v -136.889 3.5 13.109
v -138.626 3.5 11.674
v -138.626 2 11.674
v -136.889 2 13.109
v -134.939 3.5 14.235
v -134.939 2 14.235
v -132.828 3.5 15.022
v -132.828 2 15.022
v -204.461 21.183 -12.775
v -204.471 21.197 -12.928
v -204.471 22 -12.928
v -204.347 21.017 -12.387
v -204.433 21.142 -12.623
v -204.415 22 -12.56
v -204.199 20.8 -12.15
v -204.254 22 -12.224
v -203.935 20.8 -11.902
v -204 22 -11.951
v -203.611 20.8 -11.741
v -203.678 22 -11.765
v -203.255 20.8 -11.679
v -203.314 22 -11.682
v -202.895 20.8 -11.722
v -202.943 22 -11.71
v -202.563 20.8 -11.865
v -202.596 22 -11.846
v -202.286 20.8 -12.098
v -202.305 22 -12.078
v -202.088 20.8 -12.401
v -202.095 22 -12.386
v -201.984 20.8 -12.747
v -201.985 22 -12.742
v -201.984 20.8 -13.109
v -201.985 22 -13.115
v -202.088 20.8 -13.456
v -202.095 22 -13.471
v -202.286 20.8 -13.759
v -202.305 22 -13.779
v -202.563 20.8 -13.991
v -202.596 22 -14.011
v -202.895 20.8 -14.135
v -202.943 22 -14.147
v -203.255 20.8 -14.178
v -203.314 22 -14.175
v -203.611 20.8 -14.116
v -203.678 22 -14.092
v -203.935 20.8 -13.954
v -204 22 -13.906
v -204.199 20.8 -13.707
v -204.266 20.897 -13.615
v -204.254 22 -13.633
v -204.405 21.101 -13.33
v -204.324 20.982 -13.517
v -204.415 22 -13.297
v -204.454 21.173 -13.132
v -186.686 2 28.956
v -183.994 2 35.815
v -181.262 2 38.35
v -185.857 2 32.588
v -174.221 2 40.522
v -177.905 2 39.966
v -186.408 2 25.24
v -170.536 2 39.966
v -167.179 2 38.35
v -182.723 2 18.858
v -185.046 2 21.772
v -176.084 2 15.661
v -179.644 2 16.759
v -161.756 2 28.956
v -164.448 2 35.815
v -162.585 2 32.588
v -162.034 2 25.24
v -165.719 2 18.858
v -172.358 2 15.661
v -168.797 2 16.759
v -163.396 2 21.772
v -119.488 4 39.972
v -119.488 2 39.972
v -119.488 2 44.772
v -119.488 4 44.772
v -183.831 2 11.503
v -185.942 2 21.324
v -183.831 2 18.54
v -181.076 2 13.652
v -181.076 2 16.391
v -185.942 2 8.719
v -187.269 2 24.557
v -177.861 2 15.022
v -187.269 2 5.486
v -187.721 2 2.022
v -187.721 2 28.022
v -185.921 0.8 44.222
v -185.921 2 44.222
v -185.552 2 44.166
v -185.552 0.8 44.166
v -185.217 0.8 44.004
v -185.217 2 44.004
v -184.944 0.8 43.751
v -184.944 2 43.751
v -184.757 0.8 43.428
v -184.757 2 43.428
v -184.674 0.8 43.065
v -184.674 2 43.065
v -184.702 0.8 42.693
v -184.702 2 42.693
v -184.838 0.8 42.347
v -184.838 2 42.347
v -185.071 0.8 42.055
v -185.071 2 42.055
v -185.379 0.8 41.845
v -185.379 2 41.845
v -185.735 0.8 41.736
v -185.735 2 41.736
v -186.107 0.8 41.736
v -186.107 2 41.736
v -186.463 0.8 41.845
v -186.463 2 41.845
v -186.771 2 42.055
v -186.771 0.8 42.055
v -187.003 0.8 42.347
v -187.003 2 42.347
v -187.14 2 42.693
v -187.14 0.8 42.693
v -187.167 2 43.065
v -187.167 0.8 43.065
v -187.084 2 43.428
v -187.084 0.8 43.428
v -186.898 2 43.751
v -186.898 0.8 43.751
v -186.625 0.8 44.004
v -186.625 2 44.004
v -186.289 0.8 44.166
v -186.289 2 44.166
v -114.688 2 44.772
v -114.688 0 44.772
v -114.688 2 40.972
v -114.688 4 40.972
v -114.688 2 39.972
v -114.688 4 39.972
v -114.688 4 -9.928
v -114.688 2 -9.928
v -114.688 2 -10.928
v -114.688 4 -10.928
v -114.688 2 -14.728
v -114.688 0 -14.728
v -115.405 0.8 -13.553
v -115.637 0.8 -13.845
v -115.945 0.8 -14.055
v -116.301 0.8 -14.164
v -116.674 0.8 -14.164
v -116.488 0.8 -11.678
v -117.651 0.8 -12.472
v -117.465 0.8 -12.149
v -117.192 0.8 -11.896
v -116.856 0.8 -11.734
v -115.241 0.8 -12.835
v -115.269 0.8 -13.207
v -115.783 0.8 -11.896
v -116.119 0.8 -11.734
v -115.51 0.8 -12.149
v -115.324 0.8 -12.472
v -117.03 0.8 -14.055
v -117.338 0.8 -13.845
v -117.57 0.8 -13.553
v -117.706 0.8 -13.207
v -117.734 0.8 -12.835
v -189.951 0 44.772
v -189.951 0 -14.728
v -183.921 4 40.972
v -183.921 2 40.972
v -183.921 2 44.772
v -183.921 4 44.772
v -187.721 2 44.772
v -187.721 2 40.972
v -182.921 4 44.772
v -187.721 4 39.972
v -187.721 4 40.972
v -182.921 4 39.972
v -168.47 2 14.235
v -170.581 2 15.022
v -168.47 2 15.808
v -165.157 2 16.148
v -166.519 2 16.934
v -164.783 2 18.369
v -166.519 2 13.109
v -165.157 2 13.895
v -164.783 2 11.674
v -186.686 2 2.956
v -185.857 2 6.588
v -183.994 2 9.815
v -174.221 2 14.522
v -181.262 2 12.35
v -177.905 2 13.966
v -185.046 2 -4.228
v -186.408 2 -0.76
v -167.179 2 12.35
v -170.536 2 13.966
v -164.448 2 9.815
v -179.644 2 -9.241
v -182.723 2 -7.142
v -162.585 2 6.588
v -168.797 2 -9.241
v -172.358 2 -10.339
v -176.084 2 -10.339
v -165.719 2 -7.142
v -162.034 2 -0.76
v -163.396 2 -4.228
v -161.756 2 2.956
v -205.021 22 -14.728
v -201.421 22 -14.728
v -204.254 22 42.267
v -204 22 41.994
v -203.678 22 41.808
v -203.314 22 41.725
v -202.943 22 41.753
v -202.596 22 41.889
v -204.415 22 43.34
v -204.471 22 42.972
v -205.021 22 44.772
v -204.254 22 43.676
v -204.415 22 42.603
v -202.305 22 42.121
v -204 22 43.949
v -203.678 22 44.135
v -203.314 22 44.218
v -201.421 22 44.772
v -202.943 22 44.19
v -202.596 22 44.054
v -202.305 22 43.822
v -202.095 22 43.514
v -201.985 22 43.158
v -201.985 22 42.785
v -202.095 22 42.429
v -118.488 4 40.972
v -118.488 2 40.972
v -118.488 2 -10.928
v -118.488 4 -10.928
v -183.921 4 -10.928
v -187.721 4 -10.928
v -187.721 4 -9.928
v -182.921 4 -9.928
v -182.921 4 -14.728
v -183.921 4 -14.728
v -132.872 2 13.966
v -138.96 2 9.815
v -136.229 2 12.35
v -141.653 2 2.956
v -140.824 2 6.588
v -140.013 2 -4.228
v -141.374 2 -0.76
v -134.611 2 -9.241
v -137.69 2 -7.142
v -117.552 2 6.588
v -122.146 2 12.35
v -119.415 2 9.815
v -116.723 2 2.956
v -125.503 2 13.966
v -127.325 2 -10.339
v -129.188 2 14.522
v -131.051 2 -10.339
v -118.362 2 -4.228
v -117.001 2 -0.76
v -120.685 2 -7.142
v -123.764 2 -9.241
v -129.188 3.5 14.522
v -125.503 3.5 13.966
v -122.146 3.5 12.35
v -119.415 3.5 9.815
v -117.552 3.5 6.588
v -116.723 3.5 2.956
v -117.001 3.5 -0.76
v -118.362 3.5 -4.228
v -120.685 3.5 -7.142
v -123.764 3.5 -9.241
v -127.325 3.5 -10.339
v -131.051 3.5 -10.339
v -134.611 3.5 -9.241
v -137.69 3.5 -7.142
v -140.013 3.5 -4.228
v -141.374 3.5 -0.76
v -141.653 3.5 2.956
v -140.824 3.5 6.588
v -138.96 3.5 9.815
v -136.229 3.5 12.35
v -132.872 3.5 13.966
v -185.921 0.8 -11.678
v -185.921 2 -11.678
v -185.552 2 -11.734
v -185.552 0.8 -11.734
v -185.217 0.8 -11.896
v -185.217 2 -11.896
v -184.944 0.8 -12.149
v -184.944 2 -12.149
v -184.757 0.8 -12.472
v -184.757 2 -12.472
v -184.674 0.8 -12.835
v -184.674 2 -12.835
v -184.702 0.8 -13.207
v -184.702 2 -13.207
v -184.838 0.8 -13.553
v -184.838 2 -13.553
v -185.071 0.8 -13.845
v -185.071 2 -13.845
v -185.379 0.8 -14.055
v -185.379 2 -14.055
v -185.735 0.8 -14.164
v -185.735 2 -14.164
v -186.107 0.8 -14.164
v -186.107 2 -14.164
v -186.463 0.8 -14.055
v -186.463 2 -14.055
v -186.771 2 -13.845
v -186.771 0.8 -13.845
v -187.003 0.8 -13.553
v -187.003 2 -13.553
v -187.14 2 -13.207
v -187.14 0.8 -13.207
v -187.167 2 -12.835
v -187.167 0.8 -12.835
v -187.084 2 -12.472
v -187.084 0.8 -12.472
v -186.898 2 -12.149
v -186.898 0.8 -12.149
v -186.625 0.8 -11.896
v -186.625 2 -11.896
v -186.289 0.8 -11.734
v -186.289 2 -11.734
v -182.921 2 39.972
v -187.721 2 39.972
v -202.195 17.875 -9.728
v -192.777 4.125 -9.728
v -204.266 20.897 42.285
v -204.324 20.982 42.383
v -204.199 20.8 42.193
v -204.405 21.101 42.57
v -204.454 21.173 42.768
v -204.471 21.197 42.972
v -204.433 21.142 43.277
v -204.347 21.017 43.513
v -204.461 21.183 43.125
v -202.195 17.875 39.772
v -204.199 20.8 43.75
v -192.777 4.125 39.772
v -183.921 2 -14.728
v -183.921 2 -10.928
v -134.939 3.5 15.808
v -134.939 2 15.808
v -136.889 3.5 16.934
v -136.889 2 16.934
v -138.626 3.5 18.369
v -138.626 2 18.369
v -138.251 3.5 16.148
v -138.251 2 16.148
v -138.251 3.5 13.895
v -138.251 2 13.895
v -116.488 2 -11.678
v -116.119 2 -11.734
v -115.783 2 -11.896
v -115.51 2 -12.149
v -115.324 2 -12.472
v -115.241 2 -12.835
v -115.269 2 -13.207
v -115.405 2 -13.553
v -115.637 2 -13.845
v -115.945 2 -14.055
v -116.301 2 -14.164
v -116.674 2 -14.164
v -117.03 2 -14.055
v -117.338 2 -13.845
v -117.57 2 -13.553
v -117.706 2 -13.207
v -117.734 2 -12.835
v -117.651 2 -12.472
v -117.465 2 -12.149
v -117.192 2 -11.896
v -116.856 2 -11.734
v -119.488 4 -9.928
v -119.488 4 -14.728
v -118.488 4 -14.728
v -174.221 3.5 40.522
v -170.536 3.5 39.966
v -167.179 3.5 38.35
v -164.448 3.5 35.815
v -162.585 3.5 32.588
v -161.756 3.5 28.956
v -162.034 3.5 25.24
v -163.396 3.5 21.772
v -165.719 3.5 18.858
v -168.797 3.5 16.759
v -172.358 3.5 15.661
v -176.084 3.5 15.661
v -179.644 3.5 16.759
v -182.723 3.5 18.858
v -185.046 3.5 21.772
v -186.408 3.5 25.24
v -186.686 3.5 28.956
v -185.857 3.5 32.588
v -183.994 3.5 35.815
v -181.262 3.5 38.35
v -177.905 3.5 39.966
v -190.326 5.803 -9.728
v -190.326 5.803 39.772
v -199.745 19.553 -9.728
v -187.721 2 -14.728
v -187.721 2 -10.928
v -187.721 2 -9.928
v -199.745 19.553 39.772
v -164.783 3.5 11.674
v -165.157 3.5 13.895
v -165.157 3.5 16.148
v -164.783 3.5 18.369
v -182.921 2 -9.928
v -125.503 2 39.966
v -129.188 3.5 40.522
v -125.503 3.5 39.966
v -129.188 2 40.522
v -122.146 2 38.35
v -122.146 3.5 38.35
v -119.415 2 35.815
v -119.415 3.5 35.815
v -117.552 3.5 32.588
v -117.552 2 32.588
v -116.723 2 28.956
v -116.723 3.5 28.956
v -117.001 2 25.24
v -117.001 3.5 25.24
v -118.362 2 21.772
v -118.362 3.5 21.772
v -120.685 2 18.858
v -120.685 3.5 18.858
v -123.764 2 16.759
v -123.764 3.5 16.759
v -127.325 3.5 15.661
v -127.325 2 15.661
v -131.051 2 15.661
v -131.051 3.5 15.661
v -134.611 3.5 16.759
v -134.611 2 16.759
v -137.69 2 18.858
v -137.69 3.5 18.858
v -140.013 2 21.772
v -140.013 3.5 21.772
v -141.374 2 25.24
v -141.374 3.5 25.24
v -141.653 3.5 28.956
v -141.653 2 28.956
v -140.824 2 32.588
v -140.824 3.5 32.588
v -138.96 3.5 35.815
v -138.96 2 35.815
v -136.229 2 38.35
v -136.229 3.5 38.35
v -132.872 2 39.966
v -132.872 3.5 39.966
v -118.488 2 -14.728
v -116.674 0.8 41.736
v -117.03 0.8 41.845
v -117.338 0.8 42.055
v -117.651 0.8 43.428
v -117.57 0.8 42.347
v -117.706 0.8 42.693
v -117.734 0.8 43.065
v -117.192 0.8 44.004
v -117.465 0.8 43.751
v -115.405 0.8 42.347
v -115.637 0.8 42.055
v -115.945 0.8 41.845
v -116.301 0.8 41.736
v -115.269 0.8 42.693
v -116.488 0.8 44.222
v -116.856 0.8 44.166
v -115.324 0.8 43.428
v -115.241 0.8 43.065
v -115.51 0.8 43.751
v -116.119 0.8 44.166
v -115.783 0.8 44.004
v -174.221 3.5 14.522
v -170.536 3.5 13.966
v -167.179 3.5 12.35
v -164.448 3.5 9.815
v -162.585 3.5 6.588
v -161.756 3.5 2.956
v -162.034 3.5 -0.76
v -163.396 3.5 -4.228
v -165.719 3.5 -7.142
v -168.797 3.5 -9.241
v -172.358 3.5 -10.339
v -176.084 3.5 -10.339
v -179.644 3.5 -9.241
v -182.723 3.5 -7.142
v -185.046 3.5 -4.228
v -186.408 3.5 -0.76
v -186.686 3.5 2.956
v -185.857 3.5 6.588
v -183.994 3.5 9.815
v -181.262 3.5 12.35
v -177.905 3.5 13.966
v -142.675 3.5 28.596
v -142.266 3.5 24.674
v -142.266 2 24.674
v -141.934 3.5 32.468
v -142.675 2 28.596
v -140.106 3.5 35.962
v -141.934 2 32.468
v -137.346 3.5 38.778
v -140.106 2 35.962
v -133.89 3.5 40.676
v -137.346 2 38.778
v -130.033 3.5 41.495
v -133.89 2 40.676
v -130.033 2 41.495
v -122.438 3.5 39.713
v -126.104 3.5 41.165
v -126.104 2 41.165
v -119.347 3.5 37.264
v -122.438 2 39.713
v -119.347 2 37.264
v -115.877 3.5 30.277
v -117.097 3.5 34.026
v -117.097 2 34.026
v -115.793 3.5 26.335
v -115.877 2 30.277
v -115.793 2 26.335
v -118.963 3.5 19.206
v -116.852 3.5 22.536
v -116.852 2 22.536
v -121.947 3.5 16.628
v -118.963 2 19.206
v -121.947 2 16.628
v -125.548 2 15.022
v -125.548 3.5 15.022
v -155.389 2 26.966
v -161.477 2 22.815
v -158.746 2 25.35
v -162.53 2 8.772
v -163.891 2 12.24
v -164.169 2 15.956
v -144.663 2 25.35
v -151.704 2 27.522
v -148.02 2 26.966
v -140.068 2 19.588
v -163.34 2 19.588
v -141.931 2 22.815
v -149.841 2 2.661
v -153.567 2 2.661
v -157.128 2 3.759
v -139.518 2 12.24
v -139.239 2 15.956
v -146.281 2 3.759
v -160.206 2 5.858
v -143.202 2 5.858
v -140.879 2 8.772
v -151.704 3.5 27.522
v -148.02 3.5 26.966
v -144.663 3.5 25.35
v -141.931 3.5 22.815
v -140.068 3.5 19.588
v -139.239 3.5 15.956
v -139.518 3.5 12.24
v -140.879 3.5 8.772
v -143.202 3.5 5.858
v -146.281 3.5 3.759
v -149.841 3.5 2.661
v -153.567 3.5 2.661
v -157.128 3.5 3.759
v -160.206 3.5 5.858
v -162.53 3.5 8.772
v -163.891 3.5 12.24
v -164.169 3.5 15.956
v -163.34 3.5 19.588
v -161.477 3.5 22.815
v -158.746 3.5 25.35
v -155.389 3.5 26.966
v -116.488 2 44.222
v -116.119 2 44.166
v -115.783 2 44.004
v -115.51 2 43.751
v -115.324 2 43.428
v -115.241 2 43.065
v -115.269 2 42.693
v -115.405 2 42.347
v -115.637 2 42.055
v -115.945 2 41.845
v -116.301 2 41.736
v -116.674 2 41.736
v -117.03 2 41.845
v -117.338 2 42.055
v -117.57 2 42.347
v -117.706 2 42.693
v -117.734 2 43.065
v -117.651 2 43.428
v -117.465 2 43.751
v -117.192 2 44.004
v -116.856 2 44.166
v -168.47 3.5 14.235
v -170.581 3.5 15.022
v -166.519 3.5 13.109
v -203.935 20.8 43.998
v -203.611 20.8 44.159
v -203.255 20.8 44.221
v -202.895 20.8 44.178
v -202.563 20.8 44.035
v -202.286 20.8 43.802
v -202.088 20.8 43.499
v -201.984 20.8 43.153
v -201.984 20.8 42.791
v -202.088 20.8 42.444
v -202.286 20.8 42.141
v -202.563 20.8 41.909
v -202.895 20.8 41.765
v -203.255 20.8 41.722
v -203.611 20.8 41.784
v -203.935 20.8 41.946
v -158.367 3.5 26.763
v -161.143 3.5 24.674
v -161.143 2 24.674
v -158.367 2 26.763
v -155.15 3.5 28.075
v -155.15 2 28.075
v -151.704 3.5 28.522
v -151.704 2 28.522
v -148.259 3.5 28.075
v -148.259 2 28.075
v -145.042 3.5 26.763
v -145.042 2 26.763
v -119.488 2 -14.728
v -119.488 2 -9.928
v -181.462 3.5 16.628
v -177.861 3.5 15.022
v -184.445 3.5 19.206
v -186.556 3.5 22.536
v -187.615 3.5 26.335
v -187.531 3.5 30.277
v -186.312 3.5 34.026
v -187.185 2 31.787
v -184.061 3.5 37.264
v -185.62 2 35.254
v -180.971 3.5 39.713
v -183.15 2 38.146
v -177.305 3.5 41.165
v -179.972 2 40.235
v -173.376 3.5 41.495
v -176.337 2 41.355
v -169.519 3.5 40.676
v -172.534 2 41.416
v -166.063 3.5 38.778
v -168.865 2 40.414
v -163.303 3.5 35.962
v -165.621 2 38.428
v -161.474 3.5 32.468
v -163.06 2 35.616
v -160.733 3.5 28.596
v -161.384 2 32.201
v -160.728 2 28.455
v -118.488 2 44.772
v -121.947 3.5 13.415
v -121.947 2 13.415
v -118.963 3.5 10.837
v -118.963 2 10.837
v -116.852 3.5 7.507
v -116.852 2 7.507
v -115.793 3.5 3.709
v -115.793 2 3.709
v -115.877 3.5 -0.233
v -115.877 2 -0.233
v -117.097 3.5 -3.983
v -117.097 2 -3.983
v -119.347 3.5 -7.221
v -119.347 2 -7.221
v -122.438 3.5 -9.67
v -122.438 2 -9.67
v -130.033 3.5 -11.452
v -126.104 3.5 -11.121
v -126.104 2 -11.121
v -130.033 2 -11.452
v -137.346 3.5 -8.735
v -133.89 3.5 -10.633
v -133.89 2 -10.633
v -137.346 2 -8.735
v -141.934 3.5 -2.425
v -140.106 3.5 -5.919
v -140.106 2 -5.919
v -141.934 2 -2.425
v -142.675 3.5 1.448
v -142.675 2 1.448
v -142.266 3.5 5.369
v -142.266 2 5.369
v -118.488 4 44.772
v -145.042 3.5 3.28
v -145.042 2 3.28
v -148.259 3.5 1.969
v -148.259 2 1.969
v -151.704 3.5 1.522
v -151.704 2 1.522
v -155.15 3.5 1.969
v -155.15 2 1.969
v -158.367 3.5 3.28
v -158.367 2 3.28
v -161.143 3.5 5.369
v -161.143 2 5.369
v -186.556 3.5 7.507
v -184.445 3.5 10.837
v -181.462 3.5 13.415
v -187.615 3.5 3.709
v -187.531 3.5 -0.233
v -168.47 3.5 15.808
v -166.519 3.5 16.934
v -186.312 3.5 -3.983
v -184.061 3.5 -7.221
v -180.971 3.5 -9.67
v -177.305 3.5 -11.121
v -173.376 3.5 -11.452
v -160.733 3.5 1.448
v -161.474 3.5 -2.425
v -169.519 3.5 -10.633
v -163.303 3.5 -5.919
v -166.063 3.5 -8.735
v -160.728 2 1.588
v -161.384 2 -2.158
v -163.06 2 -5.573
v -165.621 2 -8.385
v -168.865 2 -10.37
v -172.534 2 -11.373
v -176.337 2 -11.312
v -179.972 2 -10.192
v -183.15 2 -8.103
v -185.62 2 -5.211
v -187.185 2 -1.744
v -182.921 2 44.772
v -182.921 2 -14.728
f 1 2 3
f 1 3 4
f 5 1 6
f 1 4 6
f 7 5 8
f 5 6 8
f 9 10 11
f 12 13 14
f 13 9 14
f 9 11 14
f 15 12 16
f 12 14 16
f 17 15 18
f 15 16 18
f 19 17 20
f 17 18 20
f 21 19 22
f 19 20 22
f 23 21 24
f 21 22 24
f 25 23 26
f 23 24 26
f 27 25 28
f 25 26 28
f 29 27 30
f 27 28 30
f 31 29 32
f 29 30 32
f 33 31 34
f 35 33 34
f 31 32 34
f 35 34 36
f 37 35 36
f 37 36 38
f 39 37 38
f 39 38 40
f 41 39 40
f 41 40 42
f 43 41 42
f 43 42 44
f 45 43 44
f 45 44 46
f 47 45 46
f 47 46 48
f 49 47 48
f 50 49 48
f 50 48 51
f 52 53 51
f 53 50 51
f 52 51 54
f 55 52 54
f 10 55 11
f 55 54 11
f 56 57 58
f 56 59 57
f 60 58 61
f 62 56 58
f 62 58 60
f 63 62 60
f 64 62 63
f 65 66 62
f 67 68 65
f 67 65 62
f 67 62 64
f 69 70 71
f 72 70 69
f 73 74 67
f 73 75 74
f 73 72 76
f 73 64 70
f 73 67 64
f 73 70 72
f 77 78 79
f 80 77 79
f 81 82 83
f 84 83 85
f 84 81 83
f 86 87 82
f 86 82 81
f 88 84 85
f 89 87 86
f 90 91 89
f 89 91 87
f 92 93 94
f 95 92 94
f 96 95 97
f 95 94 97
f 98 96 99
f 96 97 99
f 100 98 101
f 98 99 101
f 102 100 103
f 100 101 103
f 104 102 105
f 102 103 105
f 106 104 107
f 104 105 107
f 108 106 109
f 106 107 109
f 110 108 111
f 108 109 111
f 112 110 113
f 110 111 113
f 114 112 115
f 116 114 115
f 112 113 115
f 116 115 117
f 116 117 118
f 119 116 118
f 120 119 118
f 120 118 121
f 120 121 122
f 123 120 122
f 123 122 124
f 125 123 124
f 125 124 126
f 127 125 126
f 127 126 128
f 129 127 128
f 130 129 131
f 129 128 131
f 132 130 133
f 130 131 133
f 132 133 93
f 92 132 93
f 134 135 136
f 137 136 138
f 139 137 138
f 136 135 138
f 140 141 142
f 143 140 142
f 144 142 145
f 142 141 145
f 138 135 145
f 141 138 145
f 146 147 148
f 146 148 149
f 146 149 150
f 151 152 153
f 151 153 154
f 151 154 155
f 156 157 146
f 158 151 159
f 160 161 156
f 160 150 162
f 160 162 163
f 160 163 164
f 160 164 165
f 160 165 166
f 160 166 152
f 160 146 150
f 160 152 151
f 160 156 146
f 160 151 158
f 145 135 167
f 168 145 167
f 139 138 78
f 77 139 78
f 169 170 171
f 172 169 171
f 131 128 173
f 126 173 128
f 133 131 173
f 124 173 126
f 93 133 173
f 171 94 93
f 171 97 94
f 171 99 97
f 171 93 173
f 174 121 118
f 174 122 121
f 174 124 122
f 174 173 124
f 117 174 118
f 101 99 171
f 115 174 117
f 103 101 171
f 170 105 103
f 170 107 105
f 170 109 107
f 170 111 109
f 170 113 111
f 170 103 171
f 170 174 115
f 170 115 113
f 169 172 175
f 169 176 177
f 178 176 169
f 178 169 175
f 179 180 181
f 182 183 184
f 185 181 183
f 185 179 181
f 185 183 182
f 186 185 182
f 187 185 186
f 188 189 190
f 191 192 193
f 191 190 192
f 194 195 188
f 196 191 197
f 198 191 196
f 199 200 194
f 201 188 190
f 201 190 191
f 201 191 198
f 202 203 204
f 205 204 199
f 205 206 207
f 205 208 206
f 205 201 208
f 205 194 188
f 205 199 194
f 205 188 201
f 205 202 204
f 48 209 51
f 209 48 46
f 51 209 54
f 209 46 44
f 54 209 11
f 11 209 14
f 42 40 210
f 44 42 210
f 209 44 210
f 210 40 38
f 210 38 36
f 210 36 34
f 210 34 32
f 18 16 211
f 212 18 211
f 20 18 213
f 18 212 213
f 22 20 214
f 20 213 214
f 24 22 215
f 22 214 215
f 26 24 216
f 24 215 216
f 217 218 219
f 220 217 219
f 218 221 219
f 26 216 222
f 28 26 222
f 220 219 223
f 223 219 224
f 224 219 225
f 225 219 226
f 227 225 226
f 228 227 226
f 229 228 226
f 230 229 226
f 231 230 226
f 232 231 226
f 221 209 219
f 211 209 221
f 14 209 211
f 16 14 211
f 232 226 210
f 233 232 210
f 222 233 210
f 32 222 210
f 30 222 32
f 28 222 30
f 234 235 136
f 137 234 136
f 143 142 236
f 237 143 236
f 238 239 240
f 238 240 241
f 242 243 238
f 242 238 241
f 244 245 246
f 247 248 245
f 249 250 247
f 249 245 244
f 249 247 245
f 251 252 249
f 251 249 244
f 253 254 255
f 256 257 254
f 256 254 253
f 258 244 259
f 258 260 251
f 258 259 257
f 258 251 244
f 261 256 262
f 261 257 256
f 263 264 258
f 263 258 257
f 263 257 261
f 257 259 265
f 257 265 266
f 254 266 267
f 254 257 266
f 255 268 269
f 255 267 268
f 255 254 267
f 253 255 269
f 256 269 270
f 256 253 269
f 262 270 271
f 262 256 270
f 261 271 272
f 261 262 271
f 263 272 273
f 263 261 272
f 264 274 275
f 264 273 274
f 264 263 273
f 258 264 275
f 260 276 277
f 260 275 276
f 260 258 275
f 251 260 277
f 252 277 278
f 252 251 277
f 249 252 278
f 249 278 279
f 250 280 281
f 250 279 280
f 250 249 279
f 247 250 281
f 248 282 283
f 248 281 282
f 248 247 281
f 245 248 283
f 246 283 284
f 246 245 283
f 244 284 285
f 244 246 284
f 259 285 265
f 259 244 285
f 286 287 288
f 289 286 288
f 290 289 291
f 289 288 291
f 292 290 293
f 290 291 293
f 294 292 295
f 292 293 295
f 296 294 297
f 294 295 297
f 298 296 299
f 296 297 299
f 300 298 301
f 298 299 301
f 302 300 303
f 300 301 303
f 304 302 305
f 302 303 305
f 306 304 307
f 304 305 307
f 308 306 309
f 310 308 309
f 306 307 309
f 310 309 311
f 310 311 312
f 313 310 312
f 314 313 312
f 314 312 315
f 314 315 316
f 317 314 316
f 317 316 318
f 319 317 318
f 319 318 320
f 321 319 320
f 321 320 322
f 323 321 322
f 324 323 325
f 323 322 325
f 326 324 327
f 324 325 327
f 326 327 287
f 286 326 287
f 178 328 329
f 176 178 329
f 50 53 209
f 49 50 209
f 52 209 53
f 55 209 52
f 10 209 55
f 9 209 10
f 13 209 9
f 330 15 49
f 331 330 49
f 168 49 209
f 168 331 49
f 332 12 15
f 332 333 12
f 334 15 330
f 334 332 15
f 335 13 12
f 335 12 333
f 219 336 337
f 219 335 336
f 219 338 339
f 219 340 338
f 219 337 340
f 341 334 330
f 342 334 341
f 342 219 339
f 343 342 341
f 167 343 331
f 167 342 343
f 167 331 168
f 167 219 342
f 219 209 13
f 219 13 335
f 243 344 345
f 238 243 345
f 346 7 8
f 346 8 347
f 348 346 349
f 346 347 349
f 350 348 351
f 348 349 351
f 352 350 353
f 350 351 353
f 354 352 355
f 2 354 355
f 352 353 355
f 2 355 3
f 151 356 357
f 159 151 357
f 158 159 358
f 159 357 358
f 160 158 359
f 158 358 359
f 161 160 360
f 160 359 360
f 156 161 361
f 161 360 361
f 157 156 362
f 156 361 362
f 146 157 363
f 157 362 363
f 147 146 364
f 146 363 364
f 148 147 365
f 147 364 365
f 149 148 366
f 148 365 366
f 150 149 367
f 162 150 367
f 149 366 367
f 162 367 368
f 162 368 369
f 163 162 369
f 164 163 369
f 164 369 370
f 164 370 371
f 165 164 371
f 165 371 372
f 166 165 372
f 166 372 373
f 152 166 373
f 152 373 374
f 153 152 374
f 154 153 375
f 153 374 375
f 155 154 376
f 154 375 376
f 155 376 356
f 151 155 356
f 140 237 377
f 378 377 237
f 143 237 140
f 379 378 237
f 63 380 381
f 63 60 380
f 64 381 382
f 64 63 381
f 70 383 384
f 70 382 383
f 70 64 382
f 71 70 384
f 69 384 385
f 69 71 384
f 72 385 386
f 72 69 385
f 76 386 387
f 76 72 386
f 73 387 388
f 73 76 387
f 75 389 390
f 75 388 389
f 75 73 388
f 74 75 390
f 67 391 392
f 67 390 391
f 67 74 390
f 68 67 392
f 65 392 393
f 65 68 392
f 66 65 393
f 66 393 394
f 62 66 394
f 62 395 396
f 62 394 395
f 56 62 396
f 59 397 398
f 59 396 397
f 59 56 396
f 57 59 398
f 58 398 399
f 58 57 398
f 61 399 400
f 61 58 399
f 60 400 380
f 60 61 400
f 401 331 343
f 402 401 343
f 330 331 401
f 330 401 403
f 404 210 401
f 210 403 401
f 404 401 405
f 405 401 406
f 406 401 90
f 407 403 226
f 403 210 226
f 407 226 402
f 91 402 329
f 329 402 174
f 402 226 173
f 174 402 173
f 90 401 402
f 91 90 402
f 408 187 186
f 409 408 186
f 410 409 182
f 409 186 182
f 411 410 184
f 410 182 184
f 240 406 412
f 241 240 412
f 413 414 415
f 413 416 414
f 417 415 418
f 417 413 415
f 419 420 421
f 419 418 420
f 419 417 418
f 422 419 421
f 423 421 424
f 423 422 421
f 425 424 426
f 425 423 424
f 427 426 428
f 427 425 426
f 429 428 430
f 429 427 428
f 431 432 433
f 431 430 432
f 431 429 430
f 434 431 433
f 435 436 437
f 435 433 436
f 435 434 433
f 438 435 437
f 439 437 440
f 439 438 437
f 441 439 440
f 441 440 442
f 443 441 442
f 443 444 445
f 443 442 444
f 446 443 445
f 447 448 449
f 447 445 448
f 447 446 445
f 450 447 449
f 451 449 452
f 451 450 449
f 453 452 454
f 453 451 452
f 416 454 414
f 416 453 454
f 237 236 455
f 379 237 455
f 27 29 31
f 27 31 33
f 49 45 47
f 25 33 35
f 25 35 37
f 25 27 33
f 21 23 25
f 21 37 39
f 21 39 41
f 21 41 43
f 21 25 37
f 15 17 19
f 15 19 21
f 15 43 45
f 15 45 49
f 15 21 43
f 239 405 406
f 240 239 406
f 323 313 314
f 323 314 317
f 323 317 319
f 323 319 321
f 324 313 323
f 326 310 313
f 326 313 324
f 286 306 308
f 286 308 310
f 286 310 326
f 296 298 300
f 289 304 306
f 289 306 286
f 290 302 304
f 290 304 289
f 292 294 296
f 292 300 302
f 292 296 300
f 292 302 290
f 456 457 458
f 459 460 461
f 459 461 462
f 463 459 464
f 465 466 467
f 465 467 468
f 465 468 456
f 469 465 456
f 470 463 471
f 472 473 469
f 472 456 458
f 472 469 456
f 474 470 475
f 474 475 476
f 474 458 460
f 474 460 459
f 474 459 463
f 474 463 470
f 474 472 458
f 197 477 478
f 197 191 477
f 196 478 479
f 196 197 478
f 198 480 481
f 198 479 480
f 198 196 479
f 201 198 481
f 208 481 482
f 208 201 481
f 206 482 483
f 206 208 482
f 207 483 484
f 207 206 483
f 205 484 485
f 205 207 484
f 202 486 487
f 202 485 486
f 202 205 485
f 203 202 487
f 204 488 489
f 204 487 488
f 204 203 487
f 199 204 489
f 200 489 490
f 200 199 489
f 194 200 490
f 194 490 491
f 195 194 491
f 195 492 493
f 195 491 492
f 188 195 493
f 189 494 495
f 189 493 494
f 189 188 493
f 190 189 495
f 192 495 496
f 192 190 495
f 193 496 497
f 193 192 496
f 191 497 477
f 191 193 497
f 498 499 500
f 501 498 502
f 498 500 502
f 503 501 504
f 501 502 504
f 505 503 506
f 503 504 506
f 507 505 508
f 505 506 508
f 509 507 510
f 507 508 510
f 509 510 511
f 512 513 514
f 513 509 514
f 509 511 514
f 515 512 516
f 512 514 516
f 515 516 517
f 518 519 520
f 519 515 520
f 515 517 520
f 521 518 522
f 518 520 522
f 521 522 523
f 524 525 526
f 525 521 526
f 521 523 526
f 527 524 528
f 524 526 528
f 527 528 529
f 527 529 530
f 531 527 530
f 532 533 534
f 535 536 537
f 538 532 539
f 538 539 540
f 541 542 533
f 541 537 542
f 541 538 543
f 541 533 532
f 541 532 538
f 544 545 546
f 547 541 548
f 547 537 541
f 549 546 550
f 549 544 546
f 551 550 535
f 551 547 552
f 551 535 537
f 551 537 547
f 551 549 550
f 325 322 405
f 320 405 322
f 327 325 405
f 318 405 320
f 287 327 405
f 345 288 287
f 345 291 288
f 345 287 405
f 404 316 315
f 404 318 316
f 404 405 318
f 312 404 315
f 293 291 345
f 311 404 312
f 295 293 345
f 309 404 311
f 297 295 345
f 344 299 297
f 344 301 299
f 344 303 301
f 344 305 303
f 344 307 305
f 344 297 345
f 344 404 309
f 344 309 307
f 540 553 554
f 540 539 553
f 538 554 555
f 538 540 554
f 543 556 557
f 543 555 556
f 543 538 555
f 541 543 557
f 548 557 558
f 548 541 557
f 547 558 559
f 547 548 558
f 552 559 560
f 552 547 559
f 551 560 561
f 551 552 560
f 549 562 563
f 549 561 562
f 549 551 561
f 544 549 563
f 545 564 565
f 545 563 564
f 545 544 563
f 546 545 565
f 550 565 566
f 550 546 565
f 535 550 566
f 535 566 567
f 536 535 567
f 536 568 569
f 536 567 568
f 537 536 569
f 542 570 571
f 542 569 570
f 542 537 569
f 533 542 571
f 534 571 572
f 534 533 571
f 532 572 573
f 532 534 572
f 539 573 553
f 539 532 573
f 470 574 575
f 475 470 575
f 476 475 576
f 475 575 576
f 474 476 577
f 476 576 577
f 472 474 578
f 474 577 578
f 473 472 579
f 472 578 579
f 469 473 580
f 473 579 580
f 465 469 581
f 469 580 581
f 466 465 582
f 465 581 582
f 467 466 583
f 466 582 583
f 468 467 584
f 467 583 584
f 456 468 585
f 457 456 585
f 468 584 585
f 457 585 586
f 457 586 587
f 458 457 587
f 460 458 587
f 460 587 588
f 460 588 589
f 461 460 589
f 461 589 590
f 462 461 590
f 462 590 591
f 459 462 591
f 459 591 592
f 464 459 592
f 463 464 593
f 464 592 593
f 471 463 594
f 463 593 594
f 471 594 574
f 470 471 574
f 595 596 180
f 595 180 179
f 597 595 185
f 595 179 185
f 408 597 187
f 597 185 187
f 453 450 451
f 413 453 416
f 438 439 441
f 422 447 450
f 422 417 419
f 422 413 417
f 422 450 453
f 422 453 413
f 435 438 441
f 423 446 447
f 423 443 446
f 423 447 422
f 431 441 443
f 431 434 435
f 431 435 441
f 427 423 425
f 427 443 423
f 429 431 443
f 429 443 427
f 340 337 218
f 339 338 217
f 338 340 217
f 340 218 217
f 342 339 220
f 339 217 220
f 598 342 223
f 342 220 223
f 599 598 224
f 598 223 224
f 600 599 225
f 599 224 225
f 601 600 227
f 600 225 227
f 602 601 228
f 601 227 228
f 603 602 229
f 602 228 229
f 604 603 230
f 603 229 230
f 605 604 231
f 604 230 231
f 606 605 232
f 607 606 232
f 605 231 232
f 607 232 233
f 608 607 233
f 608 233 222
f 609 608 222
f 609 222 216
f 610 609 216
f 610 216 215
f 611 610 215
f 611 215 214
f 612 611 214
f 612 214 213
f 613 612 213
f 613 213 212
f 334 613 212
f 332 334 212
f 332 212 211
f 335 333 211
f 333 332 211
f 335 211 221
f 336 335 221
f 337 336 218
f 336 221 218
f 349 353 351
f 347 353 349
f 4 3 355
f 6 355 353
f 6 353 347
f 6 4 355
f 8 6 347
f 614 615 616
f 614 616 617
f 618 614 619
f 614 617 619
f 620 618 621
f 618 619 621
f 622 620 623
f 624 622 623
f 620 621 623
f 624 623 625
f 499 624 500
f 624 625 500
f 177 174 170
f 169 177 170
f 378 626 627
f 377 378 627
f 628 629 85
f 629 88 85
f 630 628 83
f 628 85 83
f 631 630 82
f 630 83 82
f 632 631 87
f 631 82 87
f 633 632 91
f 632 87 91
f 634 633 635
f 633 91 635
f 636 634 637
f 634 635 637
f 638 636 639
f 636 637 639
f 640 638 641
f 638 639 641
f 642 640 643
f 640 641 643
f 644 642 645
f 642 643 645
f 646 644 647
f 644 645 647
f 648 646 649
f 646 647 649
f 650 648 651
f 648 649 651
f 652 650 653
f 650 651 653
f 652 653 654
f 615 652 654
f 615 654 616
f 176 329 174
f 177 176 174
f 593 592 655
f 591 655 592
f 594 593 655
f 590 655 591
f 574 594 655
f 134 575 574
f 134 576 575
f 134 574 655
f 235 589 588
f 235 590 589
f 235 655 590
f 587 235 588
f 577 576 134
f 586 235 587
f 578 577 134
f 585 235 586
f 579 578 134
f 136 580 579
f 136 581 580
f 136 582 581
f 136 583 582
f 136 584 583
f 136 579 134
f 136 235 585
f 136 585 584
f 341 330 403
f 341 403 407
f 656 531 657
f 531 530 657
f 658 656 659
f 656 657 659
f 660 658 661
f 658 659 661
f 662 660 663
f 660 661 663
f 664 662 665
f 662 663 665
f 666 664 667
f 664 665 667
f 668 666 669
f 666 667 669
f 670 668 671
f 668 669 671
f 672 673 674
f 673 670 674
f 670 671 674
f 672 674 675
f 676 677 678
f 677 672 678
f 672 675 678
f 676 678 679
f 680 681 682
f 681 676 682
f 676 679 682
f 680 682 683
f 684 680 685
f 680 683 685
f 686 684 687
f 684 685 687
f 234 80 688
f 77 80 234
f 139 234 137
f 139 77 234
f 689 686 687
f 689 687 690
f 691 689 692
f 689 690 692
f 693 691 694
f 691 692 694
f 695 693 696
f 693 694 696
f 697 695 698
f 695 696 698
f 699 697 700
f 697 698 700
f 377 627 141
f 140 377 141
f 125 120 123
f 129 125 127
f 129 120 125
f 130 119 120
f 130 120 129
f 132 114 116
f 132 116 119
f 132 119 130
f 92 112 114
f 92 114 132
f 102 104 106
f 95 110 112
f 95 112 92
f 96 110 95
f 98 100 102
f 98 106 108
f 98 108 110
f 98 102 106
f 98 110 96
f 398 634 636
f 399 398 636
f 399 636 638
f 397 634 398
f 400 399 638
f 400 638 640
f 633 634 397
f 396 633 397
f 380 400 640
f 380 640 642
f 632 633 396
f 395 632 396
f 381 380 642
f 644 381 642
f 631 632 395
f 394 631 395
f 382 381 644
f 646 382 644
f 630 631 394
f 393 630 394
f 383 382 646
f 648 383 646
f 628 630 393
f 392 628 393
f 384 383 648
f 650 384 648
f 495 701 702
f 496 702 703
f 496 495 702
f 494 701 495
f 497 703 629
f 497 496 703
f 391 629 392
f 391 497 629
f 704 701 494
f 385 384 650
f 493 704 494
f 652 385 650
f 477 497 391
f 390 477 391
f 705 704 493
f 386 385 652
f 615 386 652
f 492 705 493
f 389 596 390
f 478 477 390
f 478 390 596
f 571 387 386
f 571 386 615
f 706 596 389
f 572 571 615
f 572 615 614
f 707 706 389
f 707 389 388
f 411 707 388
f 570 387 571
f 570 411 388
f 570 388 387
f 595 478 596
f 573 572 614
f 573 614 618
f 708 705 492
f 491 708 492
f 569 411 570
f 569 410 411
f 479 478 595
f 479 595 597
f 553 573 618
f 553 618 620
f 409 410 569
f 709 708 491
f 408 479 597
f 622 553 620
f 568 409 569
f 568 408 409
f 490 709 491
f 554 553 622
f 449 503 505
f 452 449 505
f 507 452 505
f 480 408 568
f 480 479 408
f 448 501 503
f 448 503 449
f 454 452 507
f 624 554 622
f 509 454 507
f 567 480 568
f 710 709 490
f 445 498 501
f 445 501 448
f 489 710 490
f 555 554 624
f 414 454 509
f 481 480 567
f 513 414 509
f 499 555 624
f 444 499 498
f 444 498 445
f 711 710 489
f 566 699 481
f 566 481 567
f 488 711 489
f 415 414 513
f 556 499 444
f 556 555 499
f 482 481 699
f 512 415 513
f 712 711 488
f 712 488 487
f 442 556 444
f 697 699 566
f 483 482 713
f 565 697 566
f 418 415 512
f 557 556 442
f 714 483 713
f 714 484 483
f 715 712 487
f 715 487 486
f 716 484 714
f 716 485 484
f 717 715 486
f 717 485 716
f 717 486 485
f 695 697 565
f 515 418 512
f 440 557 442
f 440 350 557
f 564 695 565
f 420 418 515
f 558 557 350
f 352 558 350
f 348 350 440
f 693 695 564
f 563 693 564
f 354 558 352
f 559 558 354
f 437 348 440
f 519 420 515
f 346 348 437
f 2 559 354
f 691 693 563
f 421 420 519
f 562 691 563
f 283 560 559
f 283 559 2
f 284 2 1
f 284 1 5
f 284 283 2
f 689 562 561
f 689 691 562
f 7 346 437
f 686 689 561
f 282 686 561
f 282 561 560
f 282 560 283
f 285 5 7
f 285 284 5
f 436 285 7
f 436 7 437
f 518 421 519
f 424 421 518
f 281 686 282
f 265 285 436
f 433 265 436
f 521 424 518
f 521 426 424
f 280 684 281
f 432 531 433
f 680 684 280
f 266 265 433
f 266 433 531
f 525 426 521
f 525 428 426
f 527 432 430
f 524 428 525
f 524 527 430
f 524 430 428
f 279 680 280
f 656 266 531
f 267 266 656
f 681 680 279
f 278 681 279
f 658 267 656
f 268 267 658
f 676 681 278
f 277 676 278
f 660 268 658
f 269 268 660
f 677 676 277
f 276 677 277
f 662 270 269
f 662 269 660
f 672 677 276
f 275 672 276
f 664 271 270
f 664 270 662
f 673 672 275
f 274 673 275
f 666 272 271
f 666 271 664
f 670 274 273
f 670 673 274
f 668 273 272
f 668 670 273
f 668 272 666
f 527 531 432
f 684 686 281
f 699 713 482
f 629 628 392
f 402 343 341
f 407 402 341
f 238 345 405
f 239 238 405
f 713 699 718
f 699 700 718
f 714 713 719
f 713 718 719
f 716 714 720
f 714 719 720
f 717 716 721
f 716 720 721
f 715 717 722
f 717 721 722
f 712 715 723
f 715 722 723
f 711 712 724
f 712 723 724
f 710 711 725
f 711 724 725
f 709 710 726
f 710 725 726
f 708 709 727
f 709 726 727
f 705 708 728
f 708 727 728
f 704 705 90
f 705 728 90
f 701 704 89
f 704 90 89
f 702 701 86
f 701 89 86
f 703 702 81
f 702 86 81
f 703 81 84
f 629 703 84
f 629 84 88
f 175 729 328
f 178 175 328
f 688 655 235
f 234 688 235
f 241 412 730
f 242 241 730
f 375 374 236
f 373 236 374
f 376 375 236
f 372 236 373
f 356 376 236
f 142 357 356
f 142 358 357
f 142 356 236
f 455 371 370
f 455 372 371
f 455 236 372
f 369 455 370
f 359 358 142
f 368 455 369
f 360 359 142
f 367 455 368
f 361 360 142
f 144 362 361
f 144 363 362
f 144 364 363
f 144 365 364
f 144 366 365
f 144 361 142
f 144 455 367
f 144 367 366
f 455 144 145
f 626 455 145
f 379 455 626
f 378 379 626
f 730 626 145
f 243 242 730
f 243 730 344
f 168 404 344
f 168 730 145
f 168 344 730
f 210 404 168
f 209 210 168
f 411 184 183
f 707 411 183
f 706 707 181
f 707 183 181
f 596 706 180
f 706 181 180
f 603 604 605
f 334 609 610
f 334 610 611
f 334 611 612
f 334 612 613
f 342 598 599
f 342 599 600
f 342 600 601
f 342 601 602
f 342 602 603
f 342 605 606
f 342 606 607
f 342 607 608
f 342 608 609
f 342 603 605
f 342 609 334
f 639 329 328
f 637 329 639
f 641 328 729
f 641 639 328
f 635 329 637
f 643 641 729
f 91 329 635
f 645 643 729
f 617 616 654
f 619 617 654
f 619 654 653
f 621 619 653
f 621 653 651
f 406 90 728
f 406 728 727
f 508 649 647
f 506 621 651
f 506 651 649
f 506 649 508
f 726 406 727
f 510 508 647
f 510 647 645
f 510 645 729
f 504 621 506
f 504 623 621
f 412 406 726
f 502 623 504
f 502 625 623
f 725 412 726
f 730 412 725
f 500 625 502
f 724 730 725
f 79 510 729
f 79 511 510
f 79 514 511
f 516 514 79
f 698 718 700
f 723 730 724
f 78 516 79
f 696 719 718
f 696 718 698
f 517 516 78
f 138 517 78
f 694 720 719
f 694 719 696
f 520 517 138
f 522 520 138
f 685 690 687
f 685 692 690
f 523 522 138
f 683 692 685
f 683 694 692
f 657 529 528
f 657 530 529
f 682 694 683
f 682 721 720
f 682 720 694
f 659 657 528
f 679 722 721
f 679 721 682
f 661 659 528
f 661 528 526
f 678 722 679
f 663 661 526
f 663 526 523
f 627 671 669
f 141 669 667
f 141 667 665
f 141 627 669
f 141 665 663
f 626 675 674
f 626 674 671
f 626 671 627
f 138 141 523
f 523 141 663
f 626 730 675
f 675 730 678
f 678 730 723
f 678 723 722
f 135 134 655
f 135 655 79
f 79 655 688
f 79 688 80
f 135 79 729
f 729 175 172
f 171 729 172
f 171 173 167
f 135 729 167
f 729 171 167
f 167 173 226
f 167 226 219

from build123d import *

# Parameters (mm, degrees)
SKETCH1_W           = 73.033321
SKETCH1_H           = 59.5
BOSS_EXTRUDE1_DEPTH = 2
SKETCH2_R           = 13.5
SKETCH2_R_2         = 12.5
BOSS_EXTRUDE2_DEPTH = 1.5
SKETCH3_R           = 1.25
CUT_EXTRUDE1_DEPTH  = 1.2
BOSS_EXTRUDE3_DEPTH = 59.5
SKETCH5_R           = 1.25
CUT_EXTRUDE2_DEPTH  = 1.2
SKETCH7_W           = 49.5
SKETCH7_H           = 16.666550208
CUT_EXTRUDE4_DEPTH  = 3.6
BOSS_EXTRUDE4_DEPTH = 2


with BuildPart() as part:
    # Sketch1 → Boss-Extrude1 (new body)
    with BuildSketch(Plane(origin=(0, 0, 0), x_dir=(1, 0, 0), z_dir=(0, 1, 0))):
        with Locations((-151.204244356, -15.021595707)):
            Rectangle(SKETCH1_W, SKETCH1_H)
    extrude(amount=BOSS_EXTRUDE1_DEPTH)

    # Sketch2 → Boss-Extrude2 (add)
    # profile 1 of 5: a face of its own
    with BuildSketch(Plane(origin=(0, 2, 0), x_dir=(1, 0, 0), z_dir=(0, 1, 0))):
        with Locations((-129.187583856, -28.021595707)):
            Circle(SKETCH2_R)
        with Locations(Location((-129.187583856, -28.021595707, 0), (0, 0, 270))):
            Circle(SKETCH2_R_2, mode=Mode.SUBTRACT)
    # profile 2 of 5: a face of its own
    with BuildSketch(Plane(origin=(0, 2, 0), x_dir=(1, 0, 0), z_dir=(0, 1, 0))):
        with Locations((-129.187583856, -2.021595707)):
            Circle(SKETCH2_R)
        with Locations(Location((-129.187583856, -2.021595707, 0), (0, 0, 270))):
            Circle(SKETCH2_R_2, mode=Mode.SUBTRACT)
    # profile 3 of 5: a face of its own
    with BuildSketch(Plane(origin=(0, 2, 0), x_dir=(1, 0, 0), z_dir=(0, 1, 0))):
        with Locations((-151.704244355, -15.021595707)):
            Circle(SKETCH2_R)
        with Locations(Location((-151.704244355, -15.021595707, 0), (0, 0, 270))):
            Circle(SKETCH2_R_2, mode=Mode.SUBTRACT)
    # profile 4 of 5: a face of its own
    with BuildSketch(Plane(origin=(0, 2, 0), x_dir=(1, 0, 0), z_dir=(0, 1, 0))):
        with Locations((-174.220904853, -2.021595707)):
            Circle(SKETCH2_R)
        with Locations(Location((-174.220904853, -2.021595707, 0), (0, 0, 270))):
            Circle(SKETCH2_R_2, mode=Mode.SUBTRACT)
    # profile 5 of 5: a face of its own
    with BuildSketch(Plane(origin=(0, 2, 0), x_dir=(1, 0, 0), z_dir=(0, 1, 0))):
        with Locations((-174.220904853, -28.021595707)):
            Circle(SKETCH2_R)
        with Locations(Location((-174.220904853, -28.021595707, 0), (0, 0, 270))):
            Circle(SKETCH2_R_2, mode=Mode.SUBTRACT)
    extrude(amount=BOSS_EXTRUDE2_DEPTH)

    # Sketch3 → Cut-Extrude1 (cut)
    with BuildSketch(Plane(origin=(0, 2, 0), x_dir=(1, 0, 0), z_dir=(0, 1, 0))):
        with Locations(Location((-185.920904856, 12.928404293, 0), (0, 0, 270))):
            Circle(SKETCH3_R)
        with Locations(Location((-185.920904856, -42.971595707, 0), (0, 0, 270))):
            Circle(SKETCH3_R)
        with Locations(Location((-116.487583856, -42.971595707, 0), (0, 0, 270))):
            Circle(SKETCH3_R)
        with Locations(Location((-116.487583856, 12.928404293, 0), (0, 0, 270))):
            Circle(SKETCH3_R)
    extrude(amount=-CUT_EXTRUDE1_DEPTH, mode=Mode.SUBTRACT)

    # Sketch4 → Boss-Extrude3 (add)
    with BuildSketch(Plane.XY.offset(44.771595707)):
        Polygon((-201.420904856, 22), (-187.720904856, 2), (-187.720904856, 0), (-189.950904856, 0), (-191.320904856, 2), (-205.020904856, 22), align=None)
    extrude(amount=-BOSS_EXTRUDE3_DEPTH)

    # Sketch5 → Cut-Extrude2 (cut)
    with BuildSketch(Plane(origin=(0, 22, 0), x_dir=(1, 0, 0), z_dir=(0, 1, 0))):
        with Locations(Location((-203.220904856, 12.928404293, 0), (0, 0, 180))):
            Circle(SKETCH5_R)
        with Locations(Location((-203.220904856, -42.971595707, 0), (0, 0, 180))):
            Circle(SKETCH5_R)
    extrude(amount=-CUT_EXTRUDE2_DEPTH, mode=Mode.SUBTRACT)

    # Sketch7 → Cut-Extrude4 (cut)
    with BuildSketch(Plane(origin=(-129.286463854, -88.56122774, 0), x_dir=(0, 0, 1), z_dir=(-0.8250036029532889, -0.5651274680230048, 0))):
        with Locations((15.021595707, 120.679749014)):
            Rectangle(SKETCH7_W, SKETCH7_H)
    extrude(amount=-CUT_EXTRUDE4_DEPTH, mode=Mode.SUBTRACT)

    # Sketch8 → Boss-Extrude4 (add)
    with BuildSketch(Plane(origin=(0, 2, 0), x_dir=(1, 0, 0), z_dir=(0, 1, 0))):
        Polygon((-182.920904856, 9.928404293), (-182.920904856, 14.728404293), (-183.920904856, 14.728404293), (-183.920904856, 10.928404293), (-187.720904856, 10.928404293), (-187.720904856, 9.928404293), align=None)
        Polygon((-183.920904856, -40.971595707), (-183.920904856, -44.771595707), (-182.920904856, -44.771595707), (-182.920904856, -39.971595707), (-187.720904856, -39.971595707), (-187.720904856, -40.971595707), align=None)
        Polygon((-119.487583856, -39.971595707), (-119.487583856, -44.771595707), (-118.487583856, -44.771595707), (-118.487583856, -40.971595707), (-114.687583856, -40.971595707), (-114.687583856, -39.971595707), align=None)
        Polygon((-119.487583856, 9.928404293), (-114.687583856, 9.928404293), (-114.687583856, 10.928404293), (-118.487583856, 10.928404293), (-118.487583856, 14.728404293), (-119.487583856, 14.728404293), align=None)
    extrude(amount=BOSS_EXTRUDE4_DEPTH)


solid = part.part
